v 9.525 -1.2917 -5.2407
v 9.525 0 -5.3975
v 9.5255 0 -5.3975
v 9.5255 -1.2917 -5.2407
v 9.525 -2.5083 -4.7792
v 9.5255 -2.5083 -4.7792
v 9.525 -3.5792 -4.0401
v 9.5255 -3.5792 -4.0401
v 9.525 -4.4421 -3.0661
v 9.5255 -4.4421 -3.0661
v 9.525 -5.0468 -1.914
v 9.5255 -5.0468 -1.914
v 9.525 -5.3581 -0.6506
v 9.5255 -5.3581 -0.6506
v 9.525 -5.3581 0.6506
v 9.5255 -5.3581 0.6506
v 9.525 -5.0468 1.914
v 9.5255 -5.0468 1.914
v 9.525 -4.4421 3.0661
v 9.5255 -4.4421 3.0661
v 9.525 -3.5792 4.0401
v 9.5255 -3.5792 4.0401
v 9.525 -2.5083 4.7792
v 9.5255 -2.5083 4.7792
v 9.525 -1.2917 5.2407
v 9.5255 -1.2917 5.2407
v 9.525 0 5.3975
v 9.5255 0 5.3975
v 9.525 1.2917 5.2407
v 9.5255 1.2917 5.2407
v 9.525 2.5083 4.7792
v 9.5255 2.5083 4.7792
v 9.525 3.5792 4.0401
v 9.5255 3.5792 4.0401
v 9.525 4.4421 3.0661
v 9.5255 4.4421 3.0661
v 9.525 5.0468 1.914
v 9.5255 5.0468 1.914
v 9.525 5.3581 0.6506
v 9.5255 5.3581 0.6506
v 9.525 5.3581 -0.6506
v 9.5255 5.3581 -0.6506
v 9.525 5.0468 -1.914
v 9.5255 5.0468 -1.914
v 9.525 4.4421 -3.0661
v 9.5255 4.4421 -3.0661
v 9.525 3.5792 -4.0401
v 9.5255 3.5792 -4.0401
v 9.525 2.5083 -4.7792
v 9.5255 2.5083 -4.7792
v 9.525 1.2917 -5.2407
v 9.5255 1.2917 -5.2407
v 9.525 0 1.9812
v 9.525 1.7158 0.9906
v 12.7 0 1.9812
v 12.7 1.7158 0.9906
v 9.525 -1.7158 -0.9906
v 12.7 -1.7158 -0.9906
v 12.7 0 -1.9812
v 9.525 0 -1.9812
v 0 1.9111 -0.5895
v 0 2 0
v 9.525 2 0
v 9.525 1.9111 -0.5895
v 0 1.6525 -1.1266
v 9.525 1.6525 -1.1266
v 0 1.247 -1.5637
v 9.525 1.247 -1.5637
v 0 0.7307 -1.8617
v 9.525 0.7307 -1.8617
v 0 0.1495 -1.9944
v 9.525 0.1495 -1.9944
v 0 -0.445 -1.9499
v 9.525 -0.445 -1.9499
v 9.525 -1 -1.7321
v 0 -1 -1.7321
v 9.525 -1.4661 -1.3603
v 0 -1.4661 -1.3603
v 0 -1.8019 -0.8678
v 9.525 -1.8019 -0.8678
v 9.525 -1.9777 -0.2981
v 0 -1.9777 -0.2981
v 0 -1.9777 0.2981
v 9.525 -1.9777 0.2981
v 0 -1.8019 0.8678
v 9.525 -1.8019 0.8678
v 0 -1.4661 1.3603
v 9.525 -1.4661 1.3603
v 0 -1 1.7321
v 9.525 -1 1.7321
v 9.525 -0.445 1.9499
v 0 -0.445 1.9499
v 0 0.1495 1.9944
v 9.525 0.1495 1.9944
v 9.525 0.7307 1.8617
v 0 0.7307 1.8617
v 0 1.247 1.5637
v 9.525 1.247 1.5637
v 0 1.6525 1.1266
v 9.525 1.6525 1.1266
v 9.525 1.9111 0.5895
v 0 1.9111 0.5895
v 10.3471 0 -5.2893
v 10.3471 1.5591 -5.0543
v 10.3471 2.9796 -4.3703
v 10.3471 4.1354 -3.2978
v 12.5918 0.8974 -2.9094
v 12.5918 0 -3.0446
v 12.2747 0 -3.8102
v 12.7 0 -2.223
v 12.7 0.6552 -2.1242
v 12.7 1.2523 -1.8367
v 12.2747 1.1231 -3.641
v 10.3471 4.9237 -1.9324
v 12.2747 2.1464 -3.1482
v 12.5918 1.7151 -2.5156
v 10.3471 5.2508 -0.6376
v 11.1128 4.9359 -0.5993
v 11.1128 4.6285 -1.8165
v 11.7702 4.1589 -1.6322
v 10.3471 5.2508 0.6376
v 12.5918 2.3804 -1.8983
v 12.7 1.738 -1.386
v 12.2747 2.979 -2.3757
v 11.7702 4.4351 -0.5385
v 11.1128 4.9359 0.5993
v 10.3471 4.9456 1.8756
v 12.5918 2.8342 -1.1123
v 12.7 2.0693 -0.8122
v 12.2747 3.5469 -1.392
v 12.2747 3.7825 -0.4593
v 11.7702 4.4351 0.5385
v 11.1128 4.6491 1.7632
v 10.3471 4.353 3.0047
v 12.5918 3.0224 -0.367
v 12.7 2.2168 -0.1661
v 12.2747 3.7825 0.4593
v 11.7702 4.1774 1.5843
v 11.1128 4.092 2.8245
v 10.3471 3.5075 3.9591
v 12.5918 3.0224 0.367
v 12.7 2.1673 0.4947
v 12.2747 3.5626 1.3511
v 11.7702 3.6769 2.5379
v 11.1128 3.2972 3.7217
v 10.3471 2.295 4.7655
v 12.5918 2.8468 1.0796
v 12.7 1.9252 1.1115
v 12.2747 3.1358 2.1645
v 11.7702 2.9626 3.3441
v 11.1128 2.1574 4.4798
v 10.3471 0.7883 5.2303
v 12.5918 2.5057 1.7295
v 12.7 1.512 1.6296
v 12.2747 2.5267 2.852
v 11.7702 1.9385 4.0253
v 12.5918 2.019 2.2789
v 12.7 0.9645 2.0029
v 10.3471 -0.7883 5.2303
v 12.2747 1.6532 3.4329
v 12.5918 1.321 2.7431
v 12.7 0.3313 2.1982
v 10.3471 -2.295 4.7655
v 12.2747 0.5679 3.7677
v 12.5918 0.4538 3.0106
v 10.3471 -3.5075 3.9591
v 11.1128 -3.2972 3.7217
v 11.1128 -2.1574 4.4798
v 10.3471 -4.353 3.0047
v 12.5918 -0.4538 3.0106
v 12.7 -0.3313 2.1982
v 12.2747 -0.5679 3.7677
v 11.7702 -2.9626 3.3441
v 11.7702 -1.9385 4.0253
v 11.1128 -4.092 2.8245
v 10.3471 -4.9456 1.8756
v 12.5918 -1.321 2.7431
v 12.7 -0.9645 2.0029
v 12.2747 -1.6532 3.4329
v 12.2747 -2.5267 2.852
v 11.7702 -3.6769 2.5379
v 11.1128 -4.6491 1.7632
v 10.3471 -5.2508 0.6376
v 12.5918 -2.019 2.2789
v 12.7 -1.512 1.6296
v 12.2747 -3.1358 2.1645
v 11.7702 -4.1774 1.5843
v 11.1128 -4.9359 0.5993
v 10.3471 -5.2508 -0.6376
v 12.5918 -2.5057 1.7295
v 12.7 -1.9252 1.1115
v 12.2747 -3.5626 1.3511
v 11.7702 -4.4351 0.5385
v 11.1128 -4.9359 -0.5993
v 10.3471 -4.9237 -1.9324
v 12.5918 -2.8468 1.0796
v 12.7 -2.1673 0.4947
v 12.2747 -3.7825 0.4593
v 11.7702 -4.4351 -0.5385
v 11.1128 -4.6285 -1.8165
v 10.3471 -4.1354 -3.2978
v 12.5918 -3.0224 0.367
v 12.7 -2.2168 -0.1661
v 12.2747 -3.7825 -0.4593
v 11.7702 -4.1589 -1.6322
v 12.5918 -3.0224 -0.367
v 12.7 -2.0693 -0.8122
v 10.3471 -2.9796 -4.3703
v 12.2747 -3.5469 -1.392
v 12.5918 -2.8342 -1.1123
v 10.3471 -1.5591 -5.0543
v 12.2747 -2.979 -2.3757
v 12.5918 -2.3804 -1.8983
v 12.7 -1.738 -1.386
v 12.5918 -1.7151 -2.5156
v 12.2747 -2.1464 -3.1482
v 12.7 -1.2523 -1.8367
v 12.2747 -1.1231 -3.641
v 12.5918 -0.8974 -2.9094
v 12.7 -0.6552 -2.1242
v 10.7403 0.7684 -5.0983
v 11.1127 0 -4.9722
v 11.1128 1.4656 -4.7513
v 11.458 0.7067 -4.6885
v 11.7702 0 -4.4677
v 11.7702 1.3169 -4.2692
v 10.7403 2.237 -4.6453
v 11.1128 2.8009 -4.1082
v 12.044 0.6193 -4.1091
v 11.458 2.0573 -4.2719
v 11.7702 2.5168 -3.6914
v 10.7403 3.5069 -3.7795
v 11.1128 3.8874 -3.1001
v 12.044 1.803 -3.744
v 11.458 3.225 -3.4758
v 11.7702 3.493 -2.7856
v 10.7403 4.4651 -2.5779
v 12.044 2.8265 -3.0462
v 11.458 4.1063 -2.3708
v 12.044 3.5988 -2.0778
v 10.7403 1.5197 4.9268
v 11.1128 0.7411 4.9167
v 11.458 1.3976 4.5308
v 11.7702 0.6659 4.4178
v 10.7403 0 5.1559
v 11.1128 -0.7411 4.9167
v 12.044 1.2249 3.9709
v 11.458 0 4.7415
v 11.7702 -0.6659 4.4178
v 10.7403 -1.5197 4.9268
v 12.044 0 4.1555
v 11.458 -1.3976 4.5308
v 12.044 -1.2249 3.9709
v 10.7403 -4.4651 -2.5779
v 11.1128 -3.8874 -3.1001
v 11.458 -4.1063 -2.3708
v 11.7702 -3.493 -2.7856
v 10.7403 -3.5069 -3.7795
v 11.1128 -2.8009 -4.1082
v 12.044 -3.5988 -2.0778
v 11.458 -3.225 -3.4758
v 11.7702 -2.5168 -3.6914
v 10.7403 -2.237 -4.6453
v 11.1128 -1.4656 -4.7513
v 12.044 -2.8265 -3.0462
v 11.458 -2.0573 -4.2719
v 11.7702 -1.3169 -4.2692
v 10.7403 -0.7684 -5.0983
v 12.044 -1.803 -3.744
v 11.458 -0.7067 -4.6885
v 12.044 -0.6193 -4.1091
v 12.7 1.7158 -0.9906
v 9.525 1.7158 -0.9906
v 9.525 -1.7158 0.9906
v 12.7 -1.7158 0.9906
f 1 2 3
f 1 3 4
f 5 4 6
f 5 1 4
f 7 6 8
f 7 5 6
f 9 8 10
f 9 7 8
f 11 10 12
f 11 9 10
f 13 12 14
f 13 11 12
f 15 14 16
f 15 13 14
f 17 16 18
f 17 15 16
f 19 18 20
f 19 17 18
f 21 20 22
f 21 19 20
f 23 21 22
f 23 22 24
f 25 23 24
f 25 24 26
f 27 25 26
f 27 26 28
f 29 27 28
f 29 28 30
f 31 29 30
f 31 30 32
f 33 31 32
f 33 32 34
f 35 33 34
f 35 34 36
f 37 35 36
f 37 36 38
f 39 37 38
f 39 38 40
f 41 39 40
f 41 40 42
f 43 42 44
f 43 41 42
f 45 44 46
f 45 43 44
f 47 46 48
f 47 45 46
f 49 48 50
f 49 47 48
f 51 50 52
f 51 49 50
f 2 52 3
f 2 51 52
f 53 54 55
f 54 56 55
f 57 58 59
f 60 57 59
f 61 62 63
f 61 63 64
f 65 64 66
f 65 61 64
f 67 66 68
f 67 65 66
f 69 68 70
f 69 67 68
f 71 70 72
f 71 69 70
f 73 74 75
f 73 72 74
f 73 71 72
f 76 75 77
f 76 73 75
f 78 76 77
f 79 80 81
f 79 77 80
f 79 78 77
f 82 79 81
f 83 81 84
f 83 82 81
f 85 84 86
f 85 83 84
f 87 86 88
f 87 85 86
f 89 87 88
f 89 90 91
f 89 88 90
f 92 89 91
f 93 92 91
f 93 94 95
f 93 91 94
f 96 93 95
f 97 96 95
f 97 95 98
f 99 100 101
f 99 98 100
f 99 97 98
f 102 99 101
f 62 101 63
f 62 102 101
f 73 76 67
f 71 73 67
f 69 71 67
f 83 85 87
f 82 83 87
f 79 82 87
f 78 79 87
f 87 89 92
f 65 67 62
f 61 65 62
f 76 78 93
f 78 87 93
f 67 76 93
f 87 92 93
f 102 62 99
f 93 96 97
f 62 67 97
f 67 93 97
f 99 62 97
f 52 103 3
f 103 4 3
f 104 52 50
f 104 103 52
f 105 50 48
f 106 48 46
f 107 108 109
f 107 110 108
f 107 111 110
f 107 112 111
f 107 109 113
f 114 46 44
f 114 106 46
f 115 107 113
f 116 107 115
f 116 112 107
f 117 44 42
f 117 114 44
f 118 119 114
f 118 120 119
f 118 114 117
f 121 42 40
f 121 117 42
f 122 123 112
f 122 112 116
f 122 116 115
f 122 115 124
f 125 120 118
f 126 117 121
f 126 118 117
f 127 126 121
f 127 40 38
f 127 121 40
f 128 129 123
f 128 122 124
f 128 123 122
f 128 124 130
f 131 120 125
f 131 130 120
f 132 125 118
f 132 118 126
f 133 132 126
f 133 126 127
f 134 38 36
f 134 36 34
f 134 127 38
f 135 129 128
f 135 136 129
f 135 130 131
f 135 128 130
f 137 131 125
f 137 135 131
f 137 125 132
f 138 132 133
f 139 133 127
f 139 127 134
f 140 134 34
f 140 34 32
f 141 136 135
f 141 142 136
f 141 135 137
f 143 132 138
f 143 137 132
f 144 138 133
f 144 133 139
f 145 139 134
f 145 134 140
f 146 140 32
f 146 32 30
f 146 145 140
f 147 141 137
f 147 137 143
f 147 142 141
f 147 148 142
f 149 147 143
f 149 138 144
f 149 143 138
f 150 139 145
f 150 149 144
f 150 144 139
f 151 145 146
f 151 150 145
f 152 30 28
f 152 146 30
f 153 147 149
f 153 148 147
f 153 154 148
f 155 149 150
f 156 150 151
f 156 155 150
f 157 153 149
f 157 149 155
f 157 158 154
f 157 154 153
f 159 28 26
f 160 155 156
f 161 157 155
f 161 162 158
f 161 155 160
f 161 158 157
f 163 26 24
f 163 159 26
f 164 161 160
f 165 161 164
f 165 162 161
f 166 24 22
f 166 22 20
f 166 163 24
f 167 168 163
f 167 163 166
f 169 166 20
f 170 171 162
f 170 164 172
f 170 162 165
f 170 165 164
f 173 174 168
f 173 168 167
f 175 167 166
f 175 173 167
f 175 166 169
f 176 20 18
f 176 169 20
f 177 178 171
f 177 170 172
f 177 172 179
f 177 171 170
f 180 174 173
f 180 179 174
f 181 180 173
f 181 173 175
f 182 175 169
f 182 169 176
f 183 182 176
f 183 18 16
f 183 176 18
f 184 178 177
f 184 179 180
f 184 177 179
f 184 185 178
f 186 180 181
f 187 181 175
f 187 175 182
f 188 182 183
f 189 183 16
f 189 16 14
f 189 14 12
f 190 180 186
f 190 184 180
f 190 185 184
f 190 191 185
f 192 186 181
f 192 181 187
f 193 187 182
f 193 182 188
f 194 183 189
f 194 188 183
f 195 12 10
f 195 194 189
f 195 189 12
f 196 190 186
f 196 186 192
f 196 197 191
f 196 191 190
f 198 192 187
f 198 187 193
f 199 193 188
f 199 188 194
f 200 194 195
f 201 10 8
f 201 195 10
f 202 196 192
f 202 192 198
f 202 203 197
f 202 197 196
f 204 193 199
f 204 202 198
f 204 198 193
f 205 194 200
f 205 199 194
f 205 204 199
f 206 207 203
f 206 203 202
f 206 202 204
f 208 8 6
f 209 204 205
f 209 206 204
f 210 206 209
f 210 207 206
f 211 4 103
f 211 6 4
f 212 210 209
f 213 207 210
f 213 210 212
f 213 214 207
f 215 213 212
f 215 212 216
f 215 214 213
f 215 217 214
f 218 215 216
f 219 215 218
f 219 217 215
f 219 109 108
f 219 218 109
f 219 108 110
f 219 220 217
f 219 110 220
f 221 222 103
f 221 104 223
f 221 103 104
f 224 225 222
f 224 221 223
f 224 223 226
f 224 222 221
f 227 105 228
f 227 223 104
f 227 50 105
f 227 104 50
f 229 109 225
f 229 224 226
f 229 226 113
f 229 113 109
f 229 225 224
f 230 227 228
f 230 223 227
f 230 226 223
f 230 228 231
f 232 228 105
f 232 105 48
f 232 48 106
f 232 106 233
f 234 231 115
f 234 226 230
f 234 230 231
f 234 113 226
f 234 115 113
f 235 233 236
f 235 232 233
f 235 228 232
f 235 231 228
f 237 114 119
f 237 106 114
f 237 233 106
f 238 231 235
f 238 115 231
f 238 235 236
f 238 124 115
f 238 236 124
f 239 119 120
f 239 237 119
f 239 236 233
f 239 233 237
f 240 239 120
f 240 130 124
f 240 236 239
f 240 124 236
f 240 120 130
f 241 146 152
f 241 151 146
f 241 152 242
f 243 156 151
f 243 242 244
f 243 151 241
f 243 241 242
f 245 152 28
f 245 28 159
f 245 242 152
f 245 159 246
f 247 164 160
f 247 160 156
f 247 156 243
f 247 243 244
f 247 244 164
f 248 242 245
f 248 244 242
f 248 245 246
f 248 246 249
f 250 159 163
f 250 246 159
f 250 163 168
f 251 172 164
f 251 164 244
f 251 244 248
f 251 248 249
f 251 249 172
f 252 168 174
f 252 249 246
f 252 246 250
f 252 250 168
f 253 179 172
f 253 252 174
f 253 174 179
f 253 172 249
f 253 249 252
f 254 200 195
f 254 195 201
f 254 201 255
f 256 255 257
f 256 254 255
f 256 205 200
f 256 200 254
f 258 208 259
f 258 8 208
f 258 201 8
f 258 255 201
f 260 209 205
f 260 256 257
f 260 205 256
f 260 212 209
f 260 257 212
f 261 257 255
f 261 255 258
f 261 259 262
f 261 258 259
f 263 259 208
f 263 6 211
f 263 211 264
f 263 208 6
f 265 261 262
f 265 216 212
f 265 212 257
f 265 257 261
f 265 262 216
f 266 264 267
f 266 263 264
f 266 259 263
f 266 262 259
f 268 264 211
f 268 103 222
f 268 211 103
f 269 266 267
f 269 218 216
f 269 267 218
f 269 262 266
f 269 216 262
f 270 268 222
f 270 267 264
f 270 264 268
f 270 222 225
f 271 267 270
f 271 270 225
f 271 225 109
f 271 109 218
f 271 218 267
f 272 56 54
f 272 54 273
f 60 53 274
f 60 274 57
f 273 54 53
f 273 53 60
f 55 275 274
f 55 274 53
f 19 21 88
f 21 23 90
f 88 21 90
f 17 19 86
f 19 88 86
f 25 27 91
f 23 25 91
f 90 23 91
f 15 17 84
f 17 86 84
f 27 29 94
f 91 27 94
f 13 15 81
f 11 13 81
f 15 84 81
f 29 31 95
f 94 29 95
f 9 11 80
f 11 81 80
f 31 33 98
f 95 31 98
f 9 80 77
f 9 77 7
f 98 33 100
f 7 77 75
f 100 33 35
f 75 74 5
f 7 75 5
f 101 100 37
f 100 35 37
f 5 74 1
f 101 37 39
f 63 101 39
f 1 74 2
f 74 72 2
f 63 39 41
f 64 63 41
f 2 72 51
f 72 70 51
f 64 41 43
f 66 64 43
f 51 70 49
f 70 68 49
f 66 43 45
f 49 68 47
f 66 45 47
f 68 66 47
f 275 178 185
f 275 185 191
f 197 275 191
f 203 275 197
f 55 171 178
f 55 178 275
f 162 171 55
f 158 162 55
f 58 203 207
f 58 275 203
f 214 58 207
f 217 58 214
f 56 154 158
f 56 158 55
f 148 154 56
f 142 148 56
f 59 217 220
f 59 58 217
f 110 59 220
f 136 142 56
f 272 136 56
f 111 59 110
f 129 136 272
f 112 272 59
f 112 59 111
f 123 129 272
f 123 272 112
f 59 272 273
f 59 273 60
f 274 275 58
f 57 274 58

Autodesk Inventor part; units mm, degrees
ref_plane "YZ Plane" through (0, 0, 0) normal (1, 0, 0) x (0, 1, 0)
ref_plane "XZ Plane" through (0, 0, 0) normal (0, 1, 0) x (-1, 0, 0)
ref_plane "XY Plane" through (0, 0, 0) normal (0, 0, 1) x (1, 0, 0)
sketch "Sketch1" plane through (0, 0, 0) normal (1, 0, 0) x (0, 1, 0)
  circle A0 centre (0, 0) radius 2
  dimension "d0" = 4
extrude "Extrusion1" add sketch "Sketch1" along normal blind 9.525
sketch "Sketch2" plane through (9.525, 0, 0) normal (1, 0, 0) x (0, 0, -1)
  circle A0 centre (0, 0) radius 5.3975
  dimension "d3" = 10.795
extrude "Extrusion2" add sketch "Sketch2" along normal blind 3.175
sketch "Sketch3" plane through (12.7, 0, 0) normal (1, 0, 0) x (0, 0, -1)
  line L0 (0, 0) -> (1.9812, 0)
  line L1 (0, 0) -> (-1.9812, 0)
  circle A0 centre (0, 0) radius 2 projected
  line L2 (0, 0) -> (0.9906, 1.7158)
  line L3 (0, 0) -> (1.9812, 0) construction
  line L4 (0.9906, 1.7158) -> (1.9812, 0)
  line L5 (0, 0) -> (-0.9906, 1.7158)
  line L6 (0, 0) -> (1.9812, 0) construction
  line L7 (-0.9906, 1.7158) -> (0.9906, 1.7158)
  line L8 (-0.9906, 1.7158) -> (-1.9812, 0)
  line L9 (0, 0) -> (0.9906, -1.7158)
  line L10 (0, 0) -> (1.9812, 0) construction
  line L11 (0.9906, -1.7158) -> (1.9812, 0)
  line L12 (0, 0) -> (-0.9906, -1.7158)
  line L13 (0, 0) -> (1.9812, 0) construction
  line L14 (-0.9906, -1.7158) -> (0.9906, -1.7158)
  line L15 (-0.9906, -1.7158) -> (-1.9812, 0)
  dimension "d6" = 1.9812
  dimension "d7" = 1.9812
  dimension "d8" = 1.9812
  dimension "d9" = 60
  dimension "d10" = 1.9812
  dimension "d11" = 120
  dimension "d12" = 1.9812
  dimension "d13" = 60
  dimension "d14" = 1.9812
  dimension "d15" = 120
extrude "Extrusion3" cut sketch "Sketch3" against normal blind 3.175 contours L2 L4 L0 | L12 L15 L1 | L5 L7 L2 | L1 L8 L5 | L0 L11 L9 | L9 L14 L12
fillet "Fillet1" radius 3.175 1 edges at (12.7, 0, 5.3975)
thread "Thread1" size "1/4-20 UNC" class "2A" standard "ANSI Unified Screw Threads" full length
properties part number "4M Screw"
